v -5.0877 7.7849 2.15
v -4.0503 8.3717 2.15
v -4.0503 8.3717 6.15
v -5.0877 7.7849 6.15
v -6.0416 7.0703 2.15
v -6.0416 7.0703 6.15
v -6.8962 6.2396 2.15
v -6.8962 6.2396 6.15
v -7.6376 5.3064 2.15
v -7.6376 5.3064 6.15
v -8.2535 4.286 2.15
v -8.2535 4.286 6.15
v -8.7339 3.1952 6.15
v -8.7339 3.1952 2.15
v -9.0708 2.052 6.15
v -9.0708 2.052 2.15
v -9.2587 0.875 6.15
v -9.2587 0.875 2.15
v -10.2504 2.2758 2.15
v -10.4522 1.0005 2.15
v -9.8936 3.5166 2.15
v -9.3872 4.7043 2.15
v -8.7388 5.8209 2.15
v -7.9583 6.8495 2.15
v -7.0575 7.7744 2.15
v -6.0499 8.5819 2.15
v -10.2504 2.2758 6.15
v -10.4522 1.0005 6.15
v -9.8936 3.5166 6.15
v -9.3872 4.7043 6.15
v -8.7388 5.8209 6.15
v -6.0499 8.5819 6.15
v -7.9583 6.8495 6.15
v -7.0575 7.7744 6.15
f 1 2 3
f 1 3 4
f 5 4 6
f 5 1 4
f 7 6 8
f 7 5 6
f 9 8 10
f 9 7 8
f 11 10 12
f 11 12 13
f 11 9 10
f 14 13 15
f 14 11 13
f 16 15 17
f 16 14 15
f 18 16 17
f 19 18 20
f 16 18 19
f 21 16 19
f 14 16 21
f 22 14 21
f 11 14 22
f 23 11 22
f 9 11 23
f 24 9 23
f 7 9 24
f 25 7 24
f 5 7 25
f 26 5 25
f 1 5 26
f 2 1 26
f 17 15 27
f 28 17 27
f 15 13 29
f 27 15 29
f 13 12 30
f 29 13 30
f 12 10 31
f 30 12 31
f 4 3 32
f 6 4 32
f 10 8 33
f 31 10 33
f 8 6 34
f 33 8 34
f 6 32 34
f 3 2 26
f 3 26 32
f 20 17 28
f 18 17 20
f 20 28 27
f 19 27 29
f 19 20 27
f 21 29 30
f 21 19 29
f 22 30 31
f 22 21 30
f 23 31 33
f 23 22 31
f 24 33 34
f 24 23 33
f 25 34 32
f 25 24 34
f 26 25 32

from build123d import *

# Parameters (mm, degrees)
EXTRUDE_1_DEPTH          = 6.15
CUT_EXTRUDE_1_DEPTH      = 17.072414255
CUT_EXTRUDE_1_DEPTH_BACK = 17.072414255


with BuildPart() as part:
    # 草图1 → 凸台-拉伸1 (new body)
    with BuildSketch(Plane.XY):
        with BuildLine():
            Line((-9.3, 0), (-10.5, 0))
            ThreePointArc((-10.5, 0), (-0.549527541, 10.485610115), (10.442479901, 1.097548864))
            Line((10.442479901, 1.097548864), (9.249053627, 0.972114708))
            ThreePointArc((9.249053627, 0.972114708), (-0.486724393, 9.287254673), (-9.3, 0))
        make_face()
    extrude(amount=EXTRUDE_1_DEPTH)

    # 草图4 → 切除-拉伸1 (cut, two sides)
    with BuildSketch(Plane(origin=(0, 0, 6.15), x_dir=(0, 0, 1), z_dir=(-0.9945218953682734, 0.10452846326765432, 0))) as cut_extrude_1_sk:
        Polygon((0, -0.097548864), (-4, -0.097548864), (-4, 7.902451136), (0, 7.902451136), (0, 10.5), (-6.15, 10.5), (-6.15, -1.097548864), (0, -1.097548864), align=None)
    extrude(amount=CUT_EXTRUDE_1_DEPTH, mode=Mode.SUBTRACT)
    extrude(cut_extrude_1_sk.sketch, amount=-CUT_EXTRUDE_1_DEPTH_BACK, mode=Mode.SUBTRACT)


with BuildPart() as body_2:
    # of the pieces the cut leaves, the one that is kept (cut_extrude_1_keep)
    add(part.part.solids().sort_by_distance((-4.050298117, 8.371683532, 6.15))[0])


solid = body_2.part
